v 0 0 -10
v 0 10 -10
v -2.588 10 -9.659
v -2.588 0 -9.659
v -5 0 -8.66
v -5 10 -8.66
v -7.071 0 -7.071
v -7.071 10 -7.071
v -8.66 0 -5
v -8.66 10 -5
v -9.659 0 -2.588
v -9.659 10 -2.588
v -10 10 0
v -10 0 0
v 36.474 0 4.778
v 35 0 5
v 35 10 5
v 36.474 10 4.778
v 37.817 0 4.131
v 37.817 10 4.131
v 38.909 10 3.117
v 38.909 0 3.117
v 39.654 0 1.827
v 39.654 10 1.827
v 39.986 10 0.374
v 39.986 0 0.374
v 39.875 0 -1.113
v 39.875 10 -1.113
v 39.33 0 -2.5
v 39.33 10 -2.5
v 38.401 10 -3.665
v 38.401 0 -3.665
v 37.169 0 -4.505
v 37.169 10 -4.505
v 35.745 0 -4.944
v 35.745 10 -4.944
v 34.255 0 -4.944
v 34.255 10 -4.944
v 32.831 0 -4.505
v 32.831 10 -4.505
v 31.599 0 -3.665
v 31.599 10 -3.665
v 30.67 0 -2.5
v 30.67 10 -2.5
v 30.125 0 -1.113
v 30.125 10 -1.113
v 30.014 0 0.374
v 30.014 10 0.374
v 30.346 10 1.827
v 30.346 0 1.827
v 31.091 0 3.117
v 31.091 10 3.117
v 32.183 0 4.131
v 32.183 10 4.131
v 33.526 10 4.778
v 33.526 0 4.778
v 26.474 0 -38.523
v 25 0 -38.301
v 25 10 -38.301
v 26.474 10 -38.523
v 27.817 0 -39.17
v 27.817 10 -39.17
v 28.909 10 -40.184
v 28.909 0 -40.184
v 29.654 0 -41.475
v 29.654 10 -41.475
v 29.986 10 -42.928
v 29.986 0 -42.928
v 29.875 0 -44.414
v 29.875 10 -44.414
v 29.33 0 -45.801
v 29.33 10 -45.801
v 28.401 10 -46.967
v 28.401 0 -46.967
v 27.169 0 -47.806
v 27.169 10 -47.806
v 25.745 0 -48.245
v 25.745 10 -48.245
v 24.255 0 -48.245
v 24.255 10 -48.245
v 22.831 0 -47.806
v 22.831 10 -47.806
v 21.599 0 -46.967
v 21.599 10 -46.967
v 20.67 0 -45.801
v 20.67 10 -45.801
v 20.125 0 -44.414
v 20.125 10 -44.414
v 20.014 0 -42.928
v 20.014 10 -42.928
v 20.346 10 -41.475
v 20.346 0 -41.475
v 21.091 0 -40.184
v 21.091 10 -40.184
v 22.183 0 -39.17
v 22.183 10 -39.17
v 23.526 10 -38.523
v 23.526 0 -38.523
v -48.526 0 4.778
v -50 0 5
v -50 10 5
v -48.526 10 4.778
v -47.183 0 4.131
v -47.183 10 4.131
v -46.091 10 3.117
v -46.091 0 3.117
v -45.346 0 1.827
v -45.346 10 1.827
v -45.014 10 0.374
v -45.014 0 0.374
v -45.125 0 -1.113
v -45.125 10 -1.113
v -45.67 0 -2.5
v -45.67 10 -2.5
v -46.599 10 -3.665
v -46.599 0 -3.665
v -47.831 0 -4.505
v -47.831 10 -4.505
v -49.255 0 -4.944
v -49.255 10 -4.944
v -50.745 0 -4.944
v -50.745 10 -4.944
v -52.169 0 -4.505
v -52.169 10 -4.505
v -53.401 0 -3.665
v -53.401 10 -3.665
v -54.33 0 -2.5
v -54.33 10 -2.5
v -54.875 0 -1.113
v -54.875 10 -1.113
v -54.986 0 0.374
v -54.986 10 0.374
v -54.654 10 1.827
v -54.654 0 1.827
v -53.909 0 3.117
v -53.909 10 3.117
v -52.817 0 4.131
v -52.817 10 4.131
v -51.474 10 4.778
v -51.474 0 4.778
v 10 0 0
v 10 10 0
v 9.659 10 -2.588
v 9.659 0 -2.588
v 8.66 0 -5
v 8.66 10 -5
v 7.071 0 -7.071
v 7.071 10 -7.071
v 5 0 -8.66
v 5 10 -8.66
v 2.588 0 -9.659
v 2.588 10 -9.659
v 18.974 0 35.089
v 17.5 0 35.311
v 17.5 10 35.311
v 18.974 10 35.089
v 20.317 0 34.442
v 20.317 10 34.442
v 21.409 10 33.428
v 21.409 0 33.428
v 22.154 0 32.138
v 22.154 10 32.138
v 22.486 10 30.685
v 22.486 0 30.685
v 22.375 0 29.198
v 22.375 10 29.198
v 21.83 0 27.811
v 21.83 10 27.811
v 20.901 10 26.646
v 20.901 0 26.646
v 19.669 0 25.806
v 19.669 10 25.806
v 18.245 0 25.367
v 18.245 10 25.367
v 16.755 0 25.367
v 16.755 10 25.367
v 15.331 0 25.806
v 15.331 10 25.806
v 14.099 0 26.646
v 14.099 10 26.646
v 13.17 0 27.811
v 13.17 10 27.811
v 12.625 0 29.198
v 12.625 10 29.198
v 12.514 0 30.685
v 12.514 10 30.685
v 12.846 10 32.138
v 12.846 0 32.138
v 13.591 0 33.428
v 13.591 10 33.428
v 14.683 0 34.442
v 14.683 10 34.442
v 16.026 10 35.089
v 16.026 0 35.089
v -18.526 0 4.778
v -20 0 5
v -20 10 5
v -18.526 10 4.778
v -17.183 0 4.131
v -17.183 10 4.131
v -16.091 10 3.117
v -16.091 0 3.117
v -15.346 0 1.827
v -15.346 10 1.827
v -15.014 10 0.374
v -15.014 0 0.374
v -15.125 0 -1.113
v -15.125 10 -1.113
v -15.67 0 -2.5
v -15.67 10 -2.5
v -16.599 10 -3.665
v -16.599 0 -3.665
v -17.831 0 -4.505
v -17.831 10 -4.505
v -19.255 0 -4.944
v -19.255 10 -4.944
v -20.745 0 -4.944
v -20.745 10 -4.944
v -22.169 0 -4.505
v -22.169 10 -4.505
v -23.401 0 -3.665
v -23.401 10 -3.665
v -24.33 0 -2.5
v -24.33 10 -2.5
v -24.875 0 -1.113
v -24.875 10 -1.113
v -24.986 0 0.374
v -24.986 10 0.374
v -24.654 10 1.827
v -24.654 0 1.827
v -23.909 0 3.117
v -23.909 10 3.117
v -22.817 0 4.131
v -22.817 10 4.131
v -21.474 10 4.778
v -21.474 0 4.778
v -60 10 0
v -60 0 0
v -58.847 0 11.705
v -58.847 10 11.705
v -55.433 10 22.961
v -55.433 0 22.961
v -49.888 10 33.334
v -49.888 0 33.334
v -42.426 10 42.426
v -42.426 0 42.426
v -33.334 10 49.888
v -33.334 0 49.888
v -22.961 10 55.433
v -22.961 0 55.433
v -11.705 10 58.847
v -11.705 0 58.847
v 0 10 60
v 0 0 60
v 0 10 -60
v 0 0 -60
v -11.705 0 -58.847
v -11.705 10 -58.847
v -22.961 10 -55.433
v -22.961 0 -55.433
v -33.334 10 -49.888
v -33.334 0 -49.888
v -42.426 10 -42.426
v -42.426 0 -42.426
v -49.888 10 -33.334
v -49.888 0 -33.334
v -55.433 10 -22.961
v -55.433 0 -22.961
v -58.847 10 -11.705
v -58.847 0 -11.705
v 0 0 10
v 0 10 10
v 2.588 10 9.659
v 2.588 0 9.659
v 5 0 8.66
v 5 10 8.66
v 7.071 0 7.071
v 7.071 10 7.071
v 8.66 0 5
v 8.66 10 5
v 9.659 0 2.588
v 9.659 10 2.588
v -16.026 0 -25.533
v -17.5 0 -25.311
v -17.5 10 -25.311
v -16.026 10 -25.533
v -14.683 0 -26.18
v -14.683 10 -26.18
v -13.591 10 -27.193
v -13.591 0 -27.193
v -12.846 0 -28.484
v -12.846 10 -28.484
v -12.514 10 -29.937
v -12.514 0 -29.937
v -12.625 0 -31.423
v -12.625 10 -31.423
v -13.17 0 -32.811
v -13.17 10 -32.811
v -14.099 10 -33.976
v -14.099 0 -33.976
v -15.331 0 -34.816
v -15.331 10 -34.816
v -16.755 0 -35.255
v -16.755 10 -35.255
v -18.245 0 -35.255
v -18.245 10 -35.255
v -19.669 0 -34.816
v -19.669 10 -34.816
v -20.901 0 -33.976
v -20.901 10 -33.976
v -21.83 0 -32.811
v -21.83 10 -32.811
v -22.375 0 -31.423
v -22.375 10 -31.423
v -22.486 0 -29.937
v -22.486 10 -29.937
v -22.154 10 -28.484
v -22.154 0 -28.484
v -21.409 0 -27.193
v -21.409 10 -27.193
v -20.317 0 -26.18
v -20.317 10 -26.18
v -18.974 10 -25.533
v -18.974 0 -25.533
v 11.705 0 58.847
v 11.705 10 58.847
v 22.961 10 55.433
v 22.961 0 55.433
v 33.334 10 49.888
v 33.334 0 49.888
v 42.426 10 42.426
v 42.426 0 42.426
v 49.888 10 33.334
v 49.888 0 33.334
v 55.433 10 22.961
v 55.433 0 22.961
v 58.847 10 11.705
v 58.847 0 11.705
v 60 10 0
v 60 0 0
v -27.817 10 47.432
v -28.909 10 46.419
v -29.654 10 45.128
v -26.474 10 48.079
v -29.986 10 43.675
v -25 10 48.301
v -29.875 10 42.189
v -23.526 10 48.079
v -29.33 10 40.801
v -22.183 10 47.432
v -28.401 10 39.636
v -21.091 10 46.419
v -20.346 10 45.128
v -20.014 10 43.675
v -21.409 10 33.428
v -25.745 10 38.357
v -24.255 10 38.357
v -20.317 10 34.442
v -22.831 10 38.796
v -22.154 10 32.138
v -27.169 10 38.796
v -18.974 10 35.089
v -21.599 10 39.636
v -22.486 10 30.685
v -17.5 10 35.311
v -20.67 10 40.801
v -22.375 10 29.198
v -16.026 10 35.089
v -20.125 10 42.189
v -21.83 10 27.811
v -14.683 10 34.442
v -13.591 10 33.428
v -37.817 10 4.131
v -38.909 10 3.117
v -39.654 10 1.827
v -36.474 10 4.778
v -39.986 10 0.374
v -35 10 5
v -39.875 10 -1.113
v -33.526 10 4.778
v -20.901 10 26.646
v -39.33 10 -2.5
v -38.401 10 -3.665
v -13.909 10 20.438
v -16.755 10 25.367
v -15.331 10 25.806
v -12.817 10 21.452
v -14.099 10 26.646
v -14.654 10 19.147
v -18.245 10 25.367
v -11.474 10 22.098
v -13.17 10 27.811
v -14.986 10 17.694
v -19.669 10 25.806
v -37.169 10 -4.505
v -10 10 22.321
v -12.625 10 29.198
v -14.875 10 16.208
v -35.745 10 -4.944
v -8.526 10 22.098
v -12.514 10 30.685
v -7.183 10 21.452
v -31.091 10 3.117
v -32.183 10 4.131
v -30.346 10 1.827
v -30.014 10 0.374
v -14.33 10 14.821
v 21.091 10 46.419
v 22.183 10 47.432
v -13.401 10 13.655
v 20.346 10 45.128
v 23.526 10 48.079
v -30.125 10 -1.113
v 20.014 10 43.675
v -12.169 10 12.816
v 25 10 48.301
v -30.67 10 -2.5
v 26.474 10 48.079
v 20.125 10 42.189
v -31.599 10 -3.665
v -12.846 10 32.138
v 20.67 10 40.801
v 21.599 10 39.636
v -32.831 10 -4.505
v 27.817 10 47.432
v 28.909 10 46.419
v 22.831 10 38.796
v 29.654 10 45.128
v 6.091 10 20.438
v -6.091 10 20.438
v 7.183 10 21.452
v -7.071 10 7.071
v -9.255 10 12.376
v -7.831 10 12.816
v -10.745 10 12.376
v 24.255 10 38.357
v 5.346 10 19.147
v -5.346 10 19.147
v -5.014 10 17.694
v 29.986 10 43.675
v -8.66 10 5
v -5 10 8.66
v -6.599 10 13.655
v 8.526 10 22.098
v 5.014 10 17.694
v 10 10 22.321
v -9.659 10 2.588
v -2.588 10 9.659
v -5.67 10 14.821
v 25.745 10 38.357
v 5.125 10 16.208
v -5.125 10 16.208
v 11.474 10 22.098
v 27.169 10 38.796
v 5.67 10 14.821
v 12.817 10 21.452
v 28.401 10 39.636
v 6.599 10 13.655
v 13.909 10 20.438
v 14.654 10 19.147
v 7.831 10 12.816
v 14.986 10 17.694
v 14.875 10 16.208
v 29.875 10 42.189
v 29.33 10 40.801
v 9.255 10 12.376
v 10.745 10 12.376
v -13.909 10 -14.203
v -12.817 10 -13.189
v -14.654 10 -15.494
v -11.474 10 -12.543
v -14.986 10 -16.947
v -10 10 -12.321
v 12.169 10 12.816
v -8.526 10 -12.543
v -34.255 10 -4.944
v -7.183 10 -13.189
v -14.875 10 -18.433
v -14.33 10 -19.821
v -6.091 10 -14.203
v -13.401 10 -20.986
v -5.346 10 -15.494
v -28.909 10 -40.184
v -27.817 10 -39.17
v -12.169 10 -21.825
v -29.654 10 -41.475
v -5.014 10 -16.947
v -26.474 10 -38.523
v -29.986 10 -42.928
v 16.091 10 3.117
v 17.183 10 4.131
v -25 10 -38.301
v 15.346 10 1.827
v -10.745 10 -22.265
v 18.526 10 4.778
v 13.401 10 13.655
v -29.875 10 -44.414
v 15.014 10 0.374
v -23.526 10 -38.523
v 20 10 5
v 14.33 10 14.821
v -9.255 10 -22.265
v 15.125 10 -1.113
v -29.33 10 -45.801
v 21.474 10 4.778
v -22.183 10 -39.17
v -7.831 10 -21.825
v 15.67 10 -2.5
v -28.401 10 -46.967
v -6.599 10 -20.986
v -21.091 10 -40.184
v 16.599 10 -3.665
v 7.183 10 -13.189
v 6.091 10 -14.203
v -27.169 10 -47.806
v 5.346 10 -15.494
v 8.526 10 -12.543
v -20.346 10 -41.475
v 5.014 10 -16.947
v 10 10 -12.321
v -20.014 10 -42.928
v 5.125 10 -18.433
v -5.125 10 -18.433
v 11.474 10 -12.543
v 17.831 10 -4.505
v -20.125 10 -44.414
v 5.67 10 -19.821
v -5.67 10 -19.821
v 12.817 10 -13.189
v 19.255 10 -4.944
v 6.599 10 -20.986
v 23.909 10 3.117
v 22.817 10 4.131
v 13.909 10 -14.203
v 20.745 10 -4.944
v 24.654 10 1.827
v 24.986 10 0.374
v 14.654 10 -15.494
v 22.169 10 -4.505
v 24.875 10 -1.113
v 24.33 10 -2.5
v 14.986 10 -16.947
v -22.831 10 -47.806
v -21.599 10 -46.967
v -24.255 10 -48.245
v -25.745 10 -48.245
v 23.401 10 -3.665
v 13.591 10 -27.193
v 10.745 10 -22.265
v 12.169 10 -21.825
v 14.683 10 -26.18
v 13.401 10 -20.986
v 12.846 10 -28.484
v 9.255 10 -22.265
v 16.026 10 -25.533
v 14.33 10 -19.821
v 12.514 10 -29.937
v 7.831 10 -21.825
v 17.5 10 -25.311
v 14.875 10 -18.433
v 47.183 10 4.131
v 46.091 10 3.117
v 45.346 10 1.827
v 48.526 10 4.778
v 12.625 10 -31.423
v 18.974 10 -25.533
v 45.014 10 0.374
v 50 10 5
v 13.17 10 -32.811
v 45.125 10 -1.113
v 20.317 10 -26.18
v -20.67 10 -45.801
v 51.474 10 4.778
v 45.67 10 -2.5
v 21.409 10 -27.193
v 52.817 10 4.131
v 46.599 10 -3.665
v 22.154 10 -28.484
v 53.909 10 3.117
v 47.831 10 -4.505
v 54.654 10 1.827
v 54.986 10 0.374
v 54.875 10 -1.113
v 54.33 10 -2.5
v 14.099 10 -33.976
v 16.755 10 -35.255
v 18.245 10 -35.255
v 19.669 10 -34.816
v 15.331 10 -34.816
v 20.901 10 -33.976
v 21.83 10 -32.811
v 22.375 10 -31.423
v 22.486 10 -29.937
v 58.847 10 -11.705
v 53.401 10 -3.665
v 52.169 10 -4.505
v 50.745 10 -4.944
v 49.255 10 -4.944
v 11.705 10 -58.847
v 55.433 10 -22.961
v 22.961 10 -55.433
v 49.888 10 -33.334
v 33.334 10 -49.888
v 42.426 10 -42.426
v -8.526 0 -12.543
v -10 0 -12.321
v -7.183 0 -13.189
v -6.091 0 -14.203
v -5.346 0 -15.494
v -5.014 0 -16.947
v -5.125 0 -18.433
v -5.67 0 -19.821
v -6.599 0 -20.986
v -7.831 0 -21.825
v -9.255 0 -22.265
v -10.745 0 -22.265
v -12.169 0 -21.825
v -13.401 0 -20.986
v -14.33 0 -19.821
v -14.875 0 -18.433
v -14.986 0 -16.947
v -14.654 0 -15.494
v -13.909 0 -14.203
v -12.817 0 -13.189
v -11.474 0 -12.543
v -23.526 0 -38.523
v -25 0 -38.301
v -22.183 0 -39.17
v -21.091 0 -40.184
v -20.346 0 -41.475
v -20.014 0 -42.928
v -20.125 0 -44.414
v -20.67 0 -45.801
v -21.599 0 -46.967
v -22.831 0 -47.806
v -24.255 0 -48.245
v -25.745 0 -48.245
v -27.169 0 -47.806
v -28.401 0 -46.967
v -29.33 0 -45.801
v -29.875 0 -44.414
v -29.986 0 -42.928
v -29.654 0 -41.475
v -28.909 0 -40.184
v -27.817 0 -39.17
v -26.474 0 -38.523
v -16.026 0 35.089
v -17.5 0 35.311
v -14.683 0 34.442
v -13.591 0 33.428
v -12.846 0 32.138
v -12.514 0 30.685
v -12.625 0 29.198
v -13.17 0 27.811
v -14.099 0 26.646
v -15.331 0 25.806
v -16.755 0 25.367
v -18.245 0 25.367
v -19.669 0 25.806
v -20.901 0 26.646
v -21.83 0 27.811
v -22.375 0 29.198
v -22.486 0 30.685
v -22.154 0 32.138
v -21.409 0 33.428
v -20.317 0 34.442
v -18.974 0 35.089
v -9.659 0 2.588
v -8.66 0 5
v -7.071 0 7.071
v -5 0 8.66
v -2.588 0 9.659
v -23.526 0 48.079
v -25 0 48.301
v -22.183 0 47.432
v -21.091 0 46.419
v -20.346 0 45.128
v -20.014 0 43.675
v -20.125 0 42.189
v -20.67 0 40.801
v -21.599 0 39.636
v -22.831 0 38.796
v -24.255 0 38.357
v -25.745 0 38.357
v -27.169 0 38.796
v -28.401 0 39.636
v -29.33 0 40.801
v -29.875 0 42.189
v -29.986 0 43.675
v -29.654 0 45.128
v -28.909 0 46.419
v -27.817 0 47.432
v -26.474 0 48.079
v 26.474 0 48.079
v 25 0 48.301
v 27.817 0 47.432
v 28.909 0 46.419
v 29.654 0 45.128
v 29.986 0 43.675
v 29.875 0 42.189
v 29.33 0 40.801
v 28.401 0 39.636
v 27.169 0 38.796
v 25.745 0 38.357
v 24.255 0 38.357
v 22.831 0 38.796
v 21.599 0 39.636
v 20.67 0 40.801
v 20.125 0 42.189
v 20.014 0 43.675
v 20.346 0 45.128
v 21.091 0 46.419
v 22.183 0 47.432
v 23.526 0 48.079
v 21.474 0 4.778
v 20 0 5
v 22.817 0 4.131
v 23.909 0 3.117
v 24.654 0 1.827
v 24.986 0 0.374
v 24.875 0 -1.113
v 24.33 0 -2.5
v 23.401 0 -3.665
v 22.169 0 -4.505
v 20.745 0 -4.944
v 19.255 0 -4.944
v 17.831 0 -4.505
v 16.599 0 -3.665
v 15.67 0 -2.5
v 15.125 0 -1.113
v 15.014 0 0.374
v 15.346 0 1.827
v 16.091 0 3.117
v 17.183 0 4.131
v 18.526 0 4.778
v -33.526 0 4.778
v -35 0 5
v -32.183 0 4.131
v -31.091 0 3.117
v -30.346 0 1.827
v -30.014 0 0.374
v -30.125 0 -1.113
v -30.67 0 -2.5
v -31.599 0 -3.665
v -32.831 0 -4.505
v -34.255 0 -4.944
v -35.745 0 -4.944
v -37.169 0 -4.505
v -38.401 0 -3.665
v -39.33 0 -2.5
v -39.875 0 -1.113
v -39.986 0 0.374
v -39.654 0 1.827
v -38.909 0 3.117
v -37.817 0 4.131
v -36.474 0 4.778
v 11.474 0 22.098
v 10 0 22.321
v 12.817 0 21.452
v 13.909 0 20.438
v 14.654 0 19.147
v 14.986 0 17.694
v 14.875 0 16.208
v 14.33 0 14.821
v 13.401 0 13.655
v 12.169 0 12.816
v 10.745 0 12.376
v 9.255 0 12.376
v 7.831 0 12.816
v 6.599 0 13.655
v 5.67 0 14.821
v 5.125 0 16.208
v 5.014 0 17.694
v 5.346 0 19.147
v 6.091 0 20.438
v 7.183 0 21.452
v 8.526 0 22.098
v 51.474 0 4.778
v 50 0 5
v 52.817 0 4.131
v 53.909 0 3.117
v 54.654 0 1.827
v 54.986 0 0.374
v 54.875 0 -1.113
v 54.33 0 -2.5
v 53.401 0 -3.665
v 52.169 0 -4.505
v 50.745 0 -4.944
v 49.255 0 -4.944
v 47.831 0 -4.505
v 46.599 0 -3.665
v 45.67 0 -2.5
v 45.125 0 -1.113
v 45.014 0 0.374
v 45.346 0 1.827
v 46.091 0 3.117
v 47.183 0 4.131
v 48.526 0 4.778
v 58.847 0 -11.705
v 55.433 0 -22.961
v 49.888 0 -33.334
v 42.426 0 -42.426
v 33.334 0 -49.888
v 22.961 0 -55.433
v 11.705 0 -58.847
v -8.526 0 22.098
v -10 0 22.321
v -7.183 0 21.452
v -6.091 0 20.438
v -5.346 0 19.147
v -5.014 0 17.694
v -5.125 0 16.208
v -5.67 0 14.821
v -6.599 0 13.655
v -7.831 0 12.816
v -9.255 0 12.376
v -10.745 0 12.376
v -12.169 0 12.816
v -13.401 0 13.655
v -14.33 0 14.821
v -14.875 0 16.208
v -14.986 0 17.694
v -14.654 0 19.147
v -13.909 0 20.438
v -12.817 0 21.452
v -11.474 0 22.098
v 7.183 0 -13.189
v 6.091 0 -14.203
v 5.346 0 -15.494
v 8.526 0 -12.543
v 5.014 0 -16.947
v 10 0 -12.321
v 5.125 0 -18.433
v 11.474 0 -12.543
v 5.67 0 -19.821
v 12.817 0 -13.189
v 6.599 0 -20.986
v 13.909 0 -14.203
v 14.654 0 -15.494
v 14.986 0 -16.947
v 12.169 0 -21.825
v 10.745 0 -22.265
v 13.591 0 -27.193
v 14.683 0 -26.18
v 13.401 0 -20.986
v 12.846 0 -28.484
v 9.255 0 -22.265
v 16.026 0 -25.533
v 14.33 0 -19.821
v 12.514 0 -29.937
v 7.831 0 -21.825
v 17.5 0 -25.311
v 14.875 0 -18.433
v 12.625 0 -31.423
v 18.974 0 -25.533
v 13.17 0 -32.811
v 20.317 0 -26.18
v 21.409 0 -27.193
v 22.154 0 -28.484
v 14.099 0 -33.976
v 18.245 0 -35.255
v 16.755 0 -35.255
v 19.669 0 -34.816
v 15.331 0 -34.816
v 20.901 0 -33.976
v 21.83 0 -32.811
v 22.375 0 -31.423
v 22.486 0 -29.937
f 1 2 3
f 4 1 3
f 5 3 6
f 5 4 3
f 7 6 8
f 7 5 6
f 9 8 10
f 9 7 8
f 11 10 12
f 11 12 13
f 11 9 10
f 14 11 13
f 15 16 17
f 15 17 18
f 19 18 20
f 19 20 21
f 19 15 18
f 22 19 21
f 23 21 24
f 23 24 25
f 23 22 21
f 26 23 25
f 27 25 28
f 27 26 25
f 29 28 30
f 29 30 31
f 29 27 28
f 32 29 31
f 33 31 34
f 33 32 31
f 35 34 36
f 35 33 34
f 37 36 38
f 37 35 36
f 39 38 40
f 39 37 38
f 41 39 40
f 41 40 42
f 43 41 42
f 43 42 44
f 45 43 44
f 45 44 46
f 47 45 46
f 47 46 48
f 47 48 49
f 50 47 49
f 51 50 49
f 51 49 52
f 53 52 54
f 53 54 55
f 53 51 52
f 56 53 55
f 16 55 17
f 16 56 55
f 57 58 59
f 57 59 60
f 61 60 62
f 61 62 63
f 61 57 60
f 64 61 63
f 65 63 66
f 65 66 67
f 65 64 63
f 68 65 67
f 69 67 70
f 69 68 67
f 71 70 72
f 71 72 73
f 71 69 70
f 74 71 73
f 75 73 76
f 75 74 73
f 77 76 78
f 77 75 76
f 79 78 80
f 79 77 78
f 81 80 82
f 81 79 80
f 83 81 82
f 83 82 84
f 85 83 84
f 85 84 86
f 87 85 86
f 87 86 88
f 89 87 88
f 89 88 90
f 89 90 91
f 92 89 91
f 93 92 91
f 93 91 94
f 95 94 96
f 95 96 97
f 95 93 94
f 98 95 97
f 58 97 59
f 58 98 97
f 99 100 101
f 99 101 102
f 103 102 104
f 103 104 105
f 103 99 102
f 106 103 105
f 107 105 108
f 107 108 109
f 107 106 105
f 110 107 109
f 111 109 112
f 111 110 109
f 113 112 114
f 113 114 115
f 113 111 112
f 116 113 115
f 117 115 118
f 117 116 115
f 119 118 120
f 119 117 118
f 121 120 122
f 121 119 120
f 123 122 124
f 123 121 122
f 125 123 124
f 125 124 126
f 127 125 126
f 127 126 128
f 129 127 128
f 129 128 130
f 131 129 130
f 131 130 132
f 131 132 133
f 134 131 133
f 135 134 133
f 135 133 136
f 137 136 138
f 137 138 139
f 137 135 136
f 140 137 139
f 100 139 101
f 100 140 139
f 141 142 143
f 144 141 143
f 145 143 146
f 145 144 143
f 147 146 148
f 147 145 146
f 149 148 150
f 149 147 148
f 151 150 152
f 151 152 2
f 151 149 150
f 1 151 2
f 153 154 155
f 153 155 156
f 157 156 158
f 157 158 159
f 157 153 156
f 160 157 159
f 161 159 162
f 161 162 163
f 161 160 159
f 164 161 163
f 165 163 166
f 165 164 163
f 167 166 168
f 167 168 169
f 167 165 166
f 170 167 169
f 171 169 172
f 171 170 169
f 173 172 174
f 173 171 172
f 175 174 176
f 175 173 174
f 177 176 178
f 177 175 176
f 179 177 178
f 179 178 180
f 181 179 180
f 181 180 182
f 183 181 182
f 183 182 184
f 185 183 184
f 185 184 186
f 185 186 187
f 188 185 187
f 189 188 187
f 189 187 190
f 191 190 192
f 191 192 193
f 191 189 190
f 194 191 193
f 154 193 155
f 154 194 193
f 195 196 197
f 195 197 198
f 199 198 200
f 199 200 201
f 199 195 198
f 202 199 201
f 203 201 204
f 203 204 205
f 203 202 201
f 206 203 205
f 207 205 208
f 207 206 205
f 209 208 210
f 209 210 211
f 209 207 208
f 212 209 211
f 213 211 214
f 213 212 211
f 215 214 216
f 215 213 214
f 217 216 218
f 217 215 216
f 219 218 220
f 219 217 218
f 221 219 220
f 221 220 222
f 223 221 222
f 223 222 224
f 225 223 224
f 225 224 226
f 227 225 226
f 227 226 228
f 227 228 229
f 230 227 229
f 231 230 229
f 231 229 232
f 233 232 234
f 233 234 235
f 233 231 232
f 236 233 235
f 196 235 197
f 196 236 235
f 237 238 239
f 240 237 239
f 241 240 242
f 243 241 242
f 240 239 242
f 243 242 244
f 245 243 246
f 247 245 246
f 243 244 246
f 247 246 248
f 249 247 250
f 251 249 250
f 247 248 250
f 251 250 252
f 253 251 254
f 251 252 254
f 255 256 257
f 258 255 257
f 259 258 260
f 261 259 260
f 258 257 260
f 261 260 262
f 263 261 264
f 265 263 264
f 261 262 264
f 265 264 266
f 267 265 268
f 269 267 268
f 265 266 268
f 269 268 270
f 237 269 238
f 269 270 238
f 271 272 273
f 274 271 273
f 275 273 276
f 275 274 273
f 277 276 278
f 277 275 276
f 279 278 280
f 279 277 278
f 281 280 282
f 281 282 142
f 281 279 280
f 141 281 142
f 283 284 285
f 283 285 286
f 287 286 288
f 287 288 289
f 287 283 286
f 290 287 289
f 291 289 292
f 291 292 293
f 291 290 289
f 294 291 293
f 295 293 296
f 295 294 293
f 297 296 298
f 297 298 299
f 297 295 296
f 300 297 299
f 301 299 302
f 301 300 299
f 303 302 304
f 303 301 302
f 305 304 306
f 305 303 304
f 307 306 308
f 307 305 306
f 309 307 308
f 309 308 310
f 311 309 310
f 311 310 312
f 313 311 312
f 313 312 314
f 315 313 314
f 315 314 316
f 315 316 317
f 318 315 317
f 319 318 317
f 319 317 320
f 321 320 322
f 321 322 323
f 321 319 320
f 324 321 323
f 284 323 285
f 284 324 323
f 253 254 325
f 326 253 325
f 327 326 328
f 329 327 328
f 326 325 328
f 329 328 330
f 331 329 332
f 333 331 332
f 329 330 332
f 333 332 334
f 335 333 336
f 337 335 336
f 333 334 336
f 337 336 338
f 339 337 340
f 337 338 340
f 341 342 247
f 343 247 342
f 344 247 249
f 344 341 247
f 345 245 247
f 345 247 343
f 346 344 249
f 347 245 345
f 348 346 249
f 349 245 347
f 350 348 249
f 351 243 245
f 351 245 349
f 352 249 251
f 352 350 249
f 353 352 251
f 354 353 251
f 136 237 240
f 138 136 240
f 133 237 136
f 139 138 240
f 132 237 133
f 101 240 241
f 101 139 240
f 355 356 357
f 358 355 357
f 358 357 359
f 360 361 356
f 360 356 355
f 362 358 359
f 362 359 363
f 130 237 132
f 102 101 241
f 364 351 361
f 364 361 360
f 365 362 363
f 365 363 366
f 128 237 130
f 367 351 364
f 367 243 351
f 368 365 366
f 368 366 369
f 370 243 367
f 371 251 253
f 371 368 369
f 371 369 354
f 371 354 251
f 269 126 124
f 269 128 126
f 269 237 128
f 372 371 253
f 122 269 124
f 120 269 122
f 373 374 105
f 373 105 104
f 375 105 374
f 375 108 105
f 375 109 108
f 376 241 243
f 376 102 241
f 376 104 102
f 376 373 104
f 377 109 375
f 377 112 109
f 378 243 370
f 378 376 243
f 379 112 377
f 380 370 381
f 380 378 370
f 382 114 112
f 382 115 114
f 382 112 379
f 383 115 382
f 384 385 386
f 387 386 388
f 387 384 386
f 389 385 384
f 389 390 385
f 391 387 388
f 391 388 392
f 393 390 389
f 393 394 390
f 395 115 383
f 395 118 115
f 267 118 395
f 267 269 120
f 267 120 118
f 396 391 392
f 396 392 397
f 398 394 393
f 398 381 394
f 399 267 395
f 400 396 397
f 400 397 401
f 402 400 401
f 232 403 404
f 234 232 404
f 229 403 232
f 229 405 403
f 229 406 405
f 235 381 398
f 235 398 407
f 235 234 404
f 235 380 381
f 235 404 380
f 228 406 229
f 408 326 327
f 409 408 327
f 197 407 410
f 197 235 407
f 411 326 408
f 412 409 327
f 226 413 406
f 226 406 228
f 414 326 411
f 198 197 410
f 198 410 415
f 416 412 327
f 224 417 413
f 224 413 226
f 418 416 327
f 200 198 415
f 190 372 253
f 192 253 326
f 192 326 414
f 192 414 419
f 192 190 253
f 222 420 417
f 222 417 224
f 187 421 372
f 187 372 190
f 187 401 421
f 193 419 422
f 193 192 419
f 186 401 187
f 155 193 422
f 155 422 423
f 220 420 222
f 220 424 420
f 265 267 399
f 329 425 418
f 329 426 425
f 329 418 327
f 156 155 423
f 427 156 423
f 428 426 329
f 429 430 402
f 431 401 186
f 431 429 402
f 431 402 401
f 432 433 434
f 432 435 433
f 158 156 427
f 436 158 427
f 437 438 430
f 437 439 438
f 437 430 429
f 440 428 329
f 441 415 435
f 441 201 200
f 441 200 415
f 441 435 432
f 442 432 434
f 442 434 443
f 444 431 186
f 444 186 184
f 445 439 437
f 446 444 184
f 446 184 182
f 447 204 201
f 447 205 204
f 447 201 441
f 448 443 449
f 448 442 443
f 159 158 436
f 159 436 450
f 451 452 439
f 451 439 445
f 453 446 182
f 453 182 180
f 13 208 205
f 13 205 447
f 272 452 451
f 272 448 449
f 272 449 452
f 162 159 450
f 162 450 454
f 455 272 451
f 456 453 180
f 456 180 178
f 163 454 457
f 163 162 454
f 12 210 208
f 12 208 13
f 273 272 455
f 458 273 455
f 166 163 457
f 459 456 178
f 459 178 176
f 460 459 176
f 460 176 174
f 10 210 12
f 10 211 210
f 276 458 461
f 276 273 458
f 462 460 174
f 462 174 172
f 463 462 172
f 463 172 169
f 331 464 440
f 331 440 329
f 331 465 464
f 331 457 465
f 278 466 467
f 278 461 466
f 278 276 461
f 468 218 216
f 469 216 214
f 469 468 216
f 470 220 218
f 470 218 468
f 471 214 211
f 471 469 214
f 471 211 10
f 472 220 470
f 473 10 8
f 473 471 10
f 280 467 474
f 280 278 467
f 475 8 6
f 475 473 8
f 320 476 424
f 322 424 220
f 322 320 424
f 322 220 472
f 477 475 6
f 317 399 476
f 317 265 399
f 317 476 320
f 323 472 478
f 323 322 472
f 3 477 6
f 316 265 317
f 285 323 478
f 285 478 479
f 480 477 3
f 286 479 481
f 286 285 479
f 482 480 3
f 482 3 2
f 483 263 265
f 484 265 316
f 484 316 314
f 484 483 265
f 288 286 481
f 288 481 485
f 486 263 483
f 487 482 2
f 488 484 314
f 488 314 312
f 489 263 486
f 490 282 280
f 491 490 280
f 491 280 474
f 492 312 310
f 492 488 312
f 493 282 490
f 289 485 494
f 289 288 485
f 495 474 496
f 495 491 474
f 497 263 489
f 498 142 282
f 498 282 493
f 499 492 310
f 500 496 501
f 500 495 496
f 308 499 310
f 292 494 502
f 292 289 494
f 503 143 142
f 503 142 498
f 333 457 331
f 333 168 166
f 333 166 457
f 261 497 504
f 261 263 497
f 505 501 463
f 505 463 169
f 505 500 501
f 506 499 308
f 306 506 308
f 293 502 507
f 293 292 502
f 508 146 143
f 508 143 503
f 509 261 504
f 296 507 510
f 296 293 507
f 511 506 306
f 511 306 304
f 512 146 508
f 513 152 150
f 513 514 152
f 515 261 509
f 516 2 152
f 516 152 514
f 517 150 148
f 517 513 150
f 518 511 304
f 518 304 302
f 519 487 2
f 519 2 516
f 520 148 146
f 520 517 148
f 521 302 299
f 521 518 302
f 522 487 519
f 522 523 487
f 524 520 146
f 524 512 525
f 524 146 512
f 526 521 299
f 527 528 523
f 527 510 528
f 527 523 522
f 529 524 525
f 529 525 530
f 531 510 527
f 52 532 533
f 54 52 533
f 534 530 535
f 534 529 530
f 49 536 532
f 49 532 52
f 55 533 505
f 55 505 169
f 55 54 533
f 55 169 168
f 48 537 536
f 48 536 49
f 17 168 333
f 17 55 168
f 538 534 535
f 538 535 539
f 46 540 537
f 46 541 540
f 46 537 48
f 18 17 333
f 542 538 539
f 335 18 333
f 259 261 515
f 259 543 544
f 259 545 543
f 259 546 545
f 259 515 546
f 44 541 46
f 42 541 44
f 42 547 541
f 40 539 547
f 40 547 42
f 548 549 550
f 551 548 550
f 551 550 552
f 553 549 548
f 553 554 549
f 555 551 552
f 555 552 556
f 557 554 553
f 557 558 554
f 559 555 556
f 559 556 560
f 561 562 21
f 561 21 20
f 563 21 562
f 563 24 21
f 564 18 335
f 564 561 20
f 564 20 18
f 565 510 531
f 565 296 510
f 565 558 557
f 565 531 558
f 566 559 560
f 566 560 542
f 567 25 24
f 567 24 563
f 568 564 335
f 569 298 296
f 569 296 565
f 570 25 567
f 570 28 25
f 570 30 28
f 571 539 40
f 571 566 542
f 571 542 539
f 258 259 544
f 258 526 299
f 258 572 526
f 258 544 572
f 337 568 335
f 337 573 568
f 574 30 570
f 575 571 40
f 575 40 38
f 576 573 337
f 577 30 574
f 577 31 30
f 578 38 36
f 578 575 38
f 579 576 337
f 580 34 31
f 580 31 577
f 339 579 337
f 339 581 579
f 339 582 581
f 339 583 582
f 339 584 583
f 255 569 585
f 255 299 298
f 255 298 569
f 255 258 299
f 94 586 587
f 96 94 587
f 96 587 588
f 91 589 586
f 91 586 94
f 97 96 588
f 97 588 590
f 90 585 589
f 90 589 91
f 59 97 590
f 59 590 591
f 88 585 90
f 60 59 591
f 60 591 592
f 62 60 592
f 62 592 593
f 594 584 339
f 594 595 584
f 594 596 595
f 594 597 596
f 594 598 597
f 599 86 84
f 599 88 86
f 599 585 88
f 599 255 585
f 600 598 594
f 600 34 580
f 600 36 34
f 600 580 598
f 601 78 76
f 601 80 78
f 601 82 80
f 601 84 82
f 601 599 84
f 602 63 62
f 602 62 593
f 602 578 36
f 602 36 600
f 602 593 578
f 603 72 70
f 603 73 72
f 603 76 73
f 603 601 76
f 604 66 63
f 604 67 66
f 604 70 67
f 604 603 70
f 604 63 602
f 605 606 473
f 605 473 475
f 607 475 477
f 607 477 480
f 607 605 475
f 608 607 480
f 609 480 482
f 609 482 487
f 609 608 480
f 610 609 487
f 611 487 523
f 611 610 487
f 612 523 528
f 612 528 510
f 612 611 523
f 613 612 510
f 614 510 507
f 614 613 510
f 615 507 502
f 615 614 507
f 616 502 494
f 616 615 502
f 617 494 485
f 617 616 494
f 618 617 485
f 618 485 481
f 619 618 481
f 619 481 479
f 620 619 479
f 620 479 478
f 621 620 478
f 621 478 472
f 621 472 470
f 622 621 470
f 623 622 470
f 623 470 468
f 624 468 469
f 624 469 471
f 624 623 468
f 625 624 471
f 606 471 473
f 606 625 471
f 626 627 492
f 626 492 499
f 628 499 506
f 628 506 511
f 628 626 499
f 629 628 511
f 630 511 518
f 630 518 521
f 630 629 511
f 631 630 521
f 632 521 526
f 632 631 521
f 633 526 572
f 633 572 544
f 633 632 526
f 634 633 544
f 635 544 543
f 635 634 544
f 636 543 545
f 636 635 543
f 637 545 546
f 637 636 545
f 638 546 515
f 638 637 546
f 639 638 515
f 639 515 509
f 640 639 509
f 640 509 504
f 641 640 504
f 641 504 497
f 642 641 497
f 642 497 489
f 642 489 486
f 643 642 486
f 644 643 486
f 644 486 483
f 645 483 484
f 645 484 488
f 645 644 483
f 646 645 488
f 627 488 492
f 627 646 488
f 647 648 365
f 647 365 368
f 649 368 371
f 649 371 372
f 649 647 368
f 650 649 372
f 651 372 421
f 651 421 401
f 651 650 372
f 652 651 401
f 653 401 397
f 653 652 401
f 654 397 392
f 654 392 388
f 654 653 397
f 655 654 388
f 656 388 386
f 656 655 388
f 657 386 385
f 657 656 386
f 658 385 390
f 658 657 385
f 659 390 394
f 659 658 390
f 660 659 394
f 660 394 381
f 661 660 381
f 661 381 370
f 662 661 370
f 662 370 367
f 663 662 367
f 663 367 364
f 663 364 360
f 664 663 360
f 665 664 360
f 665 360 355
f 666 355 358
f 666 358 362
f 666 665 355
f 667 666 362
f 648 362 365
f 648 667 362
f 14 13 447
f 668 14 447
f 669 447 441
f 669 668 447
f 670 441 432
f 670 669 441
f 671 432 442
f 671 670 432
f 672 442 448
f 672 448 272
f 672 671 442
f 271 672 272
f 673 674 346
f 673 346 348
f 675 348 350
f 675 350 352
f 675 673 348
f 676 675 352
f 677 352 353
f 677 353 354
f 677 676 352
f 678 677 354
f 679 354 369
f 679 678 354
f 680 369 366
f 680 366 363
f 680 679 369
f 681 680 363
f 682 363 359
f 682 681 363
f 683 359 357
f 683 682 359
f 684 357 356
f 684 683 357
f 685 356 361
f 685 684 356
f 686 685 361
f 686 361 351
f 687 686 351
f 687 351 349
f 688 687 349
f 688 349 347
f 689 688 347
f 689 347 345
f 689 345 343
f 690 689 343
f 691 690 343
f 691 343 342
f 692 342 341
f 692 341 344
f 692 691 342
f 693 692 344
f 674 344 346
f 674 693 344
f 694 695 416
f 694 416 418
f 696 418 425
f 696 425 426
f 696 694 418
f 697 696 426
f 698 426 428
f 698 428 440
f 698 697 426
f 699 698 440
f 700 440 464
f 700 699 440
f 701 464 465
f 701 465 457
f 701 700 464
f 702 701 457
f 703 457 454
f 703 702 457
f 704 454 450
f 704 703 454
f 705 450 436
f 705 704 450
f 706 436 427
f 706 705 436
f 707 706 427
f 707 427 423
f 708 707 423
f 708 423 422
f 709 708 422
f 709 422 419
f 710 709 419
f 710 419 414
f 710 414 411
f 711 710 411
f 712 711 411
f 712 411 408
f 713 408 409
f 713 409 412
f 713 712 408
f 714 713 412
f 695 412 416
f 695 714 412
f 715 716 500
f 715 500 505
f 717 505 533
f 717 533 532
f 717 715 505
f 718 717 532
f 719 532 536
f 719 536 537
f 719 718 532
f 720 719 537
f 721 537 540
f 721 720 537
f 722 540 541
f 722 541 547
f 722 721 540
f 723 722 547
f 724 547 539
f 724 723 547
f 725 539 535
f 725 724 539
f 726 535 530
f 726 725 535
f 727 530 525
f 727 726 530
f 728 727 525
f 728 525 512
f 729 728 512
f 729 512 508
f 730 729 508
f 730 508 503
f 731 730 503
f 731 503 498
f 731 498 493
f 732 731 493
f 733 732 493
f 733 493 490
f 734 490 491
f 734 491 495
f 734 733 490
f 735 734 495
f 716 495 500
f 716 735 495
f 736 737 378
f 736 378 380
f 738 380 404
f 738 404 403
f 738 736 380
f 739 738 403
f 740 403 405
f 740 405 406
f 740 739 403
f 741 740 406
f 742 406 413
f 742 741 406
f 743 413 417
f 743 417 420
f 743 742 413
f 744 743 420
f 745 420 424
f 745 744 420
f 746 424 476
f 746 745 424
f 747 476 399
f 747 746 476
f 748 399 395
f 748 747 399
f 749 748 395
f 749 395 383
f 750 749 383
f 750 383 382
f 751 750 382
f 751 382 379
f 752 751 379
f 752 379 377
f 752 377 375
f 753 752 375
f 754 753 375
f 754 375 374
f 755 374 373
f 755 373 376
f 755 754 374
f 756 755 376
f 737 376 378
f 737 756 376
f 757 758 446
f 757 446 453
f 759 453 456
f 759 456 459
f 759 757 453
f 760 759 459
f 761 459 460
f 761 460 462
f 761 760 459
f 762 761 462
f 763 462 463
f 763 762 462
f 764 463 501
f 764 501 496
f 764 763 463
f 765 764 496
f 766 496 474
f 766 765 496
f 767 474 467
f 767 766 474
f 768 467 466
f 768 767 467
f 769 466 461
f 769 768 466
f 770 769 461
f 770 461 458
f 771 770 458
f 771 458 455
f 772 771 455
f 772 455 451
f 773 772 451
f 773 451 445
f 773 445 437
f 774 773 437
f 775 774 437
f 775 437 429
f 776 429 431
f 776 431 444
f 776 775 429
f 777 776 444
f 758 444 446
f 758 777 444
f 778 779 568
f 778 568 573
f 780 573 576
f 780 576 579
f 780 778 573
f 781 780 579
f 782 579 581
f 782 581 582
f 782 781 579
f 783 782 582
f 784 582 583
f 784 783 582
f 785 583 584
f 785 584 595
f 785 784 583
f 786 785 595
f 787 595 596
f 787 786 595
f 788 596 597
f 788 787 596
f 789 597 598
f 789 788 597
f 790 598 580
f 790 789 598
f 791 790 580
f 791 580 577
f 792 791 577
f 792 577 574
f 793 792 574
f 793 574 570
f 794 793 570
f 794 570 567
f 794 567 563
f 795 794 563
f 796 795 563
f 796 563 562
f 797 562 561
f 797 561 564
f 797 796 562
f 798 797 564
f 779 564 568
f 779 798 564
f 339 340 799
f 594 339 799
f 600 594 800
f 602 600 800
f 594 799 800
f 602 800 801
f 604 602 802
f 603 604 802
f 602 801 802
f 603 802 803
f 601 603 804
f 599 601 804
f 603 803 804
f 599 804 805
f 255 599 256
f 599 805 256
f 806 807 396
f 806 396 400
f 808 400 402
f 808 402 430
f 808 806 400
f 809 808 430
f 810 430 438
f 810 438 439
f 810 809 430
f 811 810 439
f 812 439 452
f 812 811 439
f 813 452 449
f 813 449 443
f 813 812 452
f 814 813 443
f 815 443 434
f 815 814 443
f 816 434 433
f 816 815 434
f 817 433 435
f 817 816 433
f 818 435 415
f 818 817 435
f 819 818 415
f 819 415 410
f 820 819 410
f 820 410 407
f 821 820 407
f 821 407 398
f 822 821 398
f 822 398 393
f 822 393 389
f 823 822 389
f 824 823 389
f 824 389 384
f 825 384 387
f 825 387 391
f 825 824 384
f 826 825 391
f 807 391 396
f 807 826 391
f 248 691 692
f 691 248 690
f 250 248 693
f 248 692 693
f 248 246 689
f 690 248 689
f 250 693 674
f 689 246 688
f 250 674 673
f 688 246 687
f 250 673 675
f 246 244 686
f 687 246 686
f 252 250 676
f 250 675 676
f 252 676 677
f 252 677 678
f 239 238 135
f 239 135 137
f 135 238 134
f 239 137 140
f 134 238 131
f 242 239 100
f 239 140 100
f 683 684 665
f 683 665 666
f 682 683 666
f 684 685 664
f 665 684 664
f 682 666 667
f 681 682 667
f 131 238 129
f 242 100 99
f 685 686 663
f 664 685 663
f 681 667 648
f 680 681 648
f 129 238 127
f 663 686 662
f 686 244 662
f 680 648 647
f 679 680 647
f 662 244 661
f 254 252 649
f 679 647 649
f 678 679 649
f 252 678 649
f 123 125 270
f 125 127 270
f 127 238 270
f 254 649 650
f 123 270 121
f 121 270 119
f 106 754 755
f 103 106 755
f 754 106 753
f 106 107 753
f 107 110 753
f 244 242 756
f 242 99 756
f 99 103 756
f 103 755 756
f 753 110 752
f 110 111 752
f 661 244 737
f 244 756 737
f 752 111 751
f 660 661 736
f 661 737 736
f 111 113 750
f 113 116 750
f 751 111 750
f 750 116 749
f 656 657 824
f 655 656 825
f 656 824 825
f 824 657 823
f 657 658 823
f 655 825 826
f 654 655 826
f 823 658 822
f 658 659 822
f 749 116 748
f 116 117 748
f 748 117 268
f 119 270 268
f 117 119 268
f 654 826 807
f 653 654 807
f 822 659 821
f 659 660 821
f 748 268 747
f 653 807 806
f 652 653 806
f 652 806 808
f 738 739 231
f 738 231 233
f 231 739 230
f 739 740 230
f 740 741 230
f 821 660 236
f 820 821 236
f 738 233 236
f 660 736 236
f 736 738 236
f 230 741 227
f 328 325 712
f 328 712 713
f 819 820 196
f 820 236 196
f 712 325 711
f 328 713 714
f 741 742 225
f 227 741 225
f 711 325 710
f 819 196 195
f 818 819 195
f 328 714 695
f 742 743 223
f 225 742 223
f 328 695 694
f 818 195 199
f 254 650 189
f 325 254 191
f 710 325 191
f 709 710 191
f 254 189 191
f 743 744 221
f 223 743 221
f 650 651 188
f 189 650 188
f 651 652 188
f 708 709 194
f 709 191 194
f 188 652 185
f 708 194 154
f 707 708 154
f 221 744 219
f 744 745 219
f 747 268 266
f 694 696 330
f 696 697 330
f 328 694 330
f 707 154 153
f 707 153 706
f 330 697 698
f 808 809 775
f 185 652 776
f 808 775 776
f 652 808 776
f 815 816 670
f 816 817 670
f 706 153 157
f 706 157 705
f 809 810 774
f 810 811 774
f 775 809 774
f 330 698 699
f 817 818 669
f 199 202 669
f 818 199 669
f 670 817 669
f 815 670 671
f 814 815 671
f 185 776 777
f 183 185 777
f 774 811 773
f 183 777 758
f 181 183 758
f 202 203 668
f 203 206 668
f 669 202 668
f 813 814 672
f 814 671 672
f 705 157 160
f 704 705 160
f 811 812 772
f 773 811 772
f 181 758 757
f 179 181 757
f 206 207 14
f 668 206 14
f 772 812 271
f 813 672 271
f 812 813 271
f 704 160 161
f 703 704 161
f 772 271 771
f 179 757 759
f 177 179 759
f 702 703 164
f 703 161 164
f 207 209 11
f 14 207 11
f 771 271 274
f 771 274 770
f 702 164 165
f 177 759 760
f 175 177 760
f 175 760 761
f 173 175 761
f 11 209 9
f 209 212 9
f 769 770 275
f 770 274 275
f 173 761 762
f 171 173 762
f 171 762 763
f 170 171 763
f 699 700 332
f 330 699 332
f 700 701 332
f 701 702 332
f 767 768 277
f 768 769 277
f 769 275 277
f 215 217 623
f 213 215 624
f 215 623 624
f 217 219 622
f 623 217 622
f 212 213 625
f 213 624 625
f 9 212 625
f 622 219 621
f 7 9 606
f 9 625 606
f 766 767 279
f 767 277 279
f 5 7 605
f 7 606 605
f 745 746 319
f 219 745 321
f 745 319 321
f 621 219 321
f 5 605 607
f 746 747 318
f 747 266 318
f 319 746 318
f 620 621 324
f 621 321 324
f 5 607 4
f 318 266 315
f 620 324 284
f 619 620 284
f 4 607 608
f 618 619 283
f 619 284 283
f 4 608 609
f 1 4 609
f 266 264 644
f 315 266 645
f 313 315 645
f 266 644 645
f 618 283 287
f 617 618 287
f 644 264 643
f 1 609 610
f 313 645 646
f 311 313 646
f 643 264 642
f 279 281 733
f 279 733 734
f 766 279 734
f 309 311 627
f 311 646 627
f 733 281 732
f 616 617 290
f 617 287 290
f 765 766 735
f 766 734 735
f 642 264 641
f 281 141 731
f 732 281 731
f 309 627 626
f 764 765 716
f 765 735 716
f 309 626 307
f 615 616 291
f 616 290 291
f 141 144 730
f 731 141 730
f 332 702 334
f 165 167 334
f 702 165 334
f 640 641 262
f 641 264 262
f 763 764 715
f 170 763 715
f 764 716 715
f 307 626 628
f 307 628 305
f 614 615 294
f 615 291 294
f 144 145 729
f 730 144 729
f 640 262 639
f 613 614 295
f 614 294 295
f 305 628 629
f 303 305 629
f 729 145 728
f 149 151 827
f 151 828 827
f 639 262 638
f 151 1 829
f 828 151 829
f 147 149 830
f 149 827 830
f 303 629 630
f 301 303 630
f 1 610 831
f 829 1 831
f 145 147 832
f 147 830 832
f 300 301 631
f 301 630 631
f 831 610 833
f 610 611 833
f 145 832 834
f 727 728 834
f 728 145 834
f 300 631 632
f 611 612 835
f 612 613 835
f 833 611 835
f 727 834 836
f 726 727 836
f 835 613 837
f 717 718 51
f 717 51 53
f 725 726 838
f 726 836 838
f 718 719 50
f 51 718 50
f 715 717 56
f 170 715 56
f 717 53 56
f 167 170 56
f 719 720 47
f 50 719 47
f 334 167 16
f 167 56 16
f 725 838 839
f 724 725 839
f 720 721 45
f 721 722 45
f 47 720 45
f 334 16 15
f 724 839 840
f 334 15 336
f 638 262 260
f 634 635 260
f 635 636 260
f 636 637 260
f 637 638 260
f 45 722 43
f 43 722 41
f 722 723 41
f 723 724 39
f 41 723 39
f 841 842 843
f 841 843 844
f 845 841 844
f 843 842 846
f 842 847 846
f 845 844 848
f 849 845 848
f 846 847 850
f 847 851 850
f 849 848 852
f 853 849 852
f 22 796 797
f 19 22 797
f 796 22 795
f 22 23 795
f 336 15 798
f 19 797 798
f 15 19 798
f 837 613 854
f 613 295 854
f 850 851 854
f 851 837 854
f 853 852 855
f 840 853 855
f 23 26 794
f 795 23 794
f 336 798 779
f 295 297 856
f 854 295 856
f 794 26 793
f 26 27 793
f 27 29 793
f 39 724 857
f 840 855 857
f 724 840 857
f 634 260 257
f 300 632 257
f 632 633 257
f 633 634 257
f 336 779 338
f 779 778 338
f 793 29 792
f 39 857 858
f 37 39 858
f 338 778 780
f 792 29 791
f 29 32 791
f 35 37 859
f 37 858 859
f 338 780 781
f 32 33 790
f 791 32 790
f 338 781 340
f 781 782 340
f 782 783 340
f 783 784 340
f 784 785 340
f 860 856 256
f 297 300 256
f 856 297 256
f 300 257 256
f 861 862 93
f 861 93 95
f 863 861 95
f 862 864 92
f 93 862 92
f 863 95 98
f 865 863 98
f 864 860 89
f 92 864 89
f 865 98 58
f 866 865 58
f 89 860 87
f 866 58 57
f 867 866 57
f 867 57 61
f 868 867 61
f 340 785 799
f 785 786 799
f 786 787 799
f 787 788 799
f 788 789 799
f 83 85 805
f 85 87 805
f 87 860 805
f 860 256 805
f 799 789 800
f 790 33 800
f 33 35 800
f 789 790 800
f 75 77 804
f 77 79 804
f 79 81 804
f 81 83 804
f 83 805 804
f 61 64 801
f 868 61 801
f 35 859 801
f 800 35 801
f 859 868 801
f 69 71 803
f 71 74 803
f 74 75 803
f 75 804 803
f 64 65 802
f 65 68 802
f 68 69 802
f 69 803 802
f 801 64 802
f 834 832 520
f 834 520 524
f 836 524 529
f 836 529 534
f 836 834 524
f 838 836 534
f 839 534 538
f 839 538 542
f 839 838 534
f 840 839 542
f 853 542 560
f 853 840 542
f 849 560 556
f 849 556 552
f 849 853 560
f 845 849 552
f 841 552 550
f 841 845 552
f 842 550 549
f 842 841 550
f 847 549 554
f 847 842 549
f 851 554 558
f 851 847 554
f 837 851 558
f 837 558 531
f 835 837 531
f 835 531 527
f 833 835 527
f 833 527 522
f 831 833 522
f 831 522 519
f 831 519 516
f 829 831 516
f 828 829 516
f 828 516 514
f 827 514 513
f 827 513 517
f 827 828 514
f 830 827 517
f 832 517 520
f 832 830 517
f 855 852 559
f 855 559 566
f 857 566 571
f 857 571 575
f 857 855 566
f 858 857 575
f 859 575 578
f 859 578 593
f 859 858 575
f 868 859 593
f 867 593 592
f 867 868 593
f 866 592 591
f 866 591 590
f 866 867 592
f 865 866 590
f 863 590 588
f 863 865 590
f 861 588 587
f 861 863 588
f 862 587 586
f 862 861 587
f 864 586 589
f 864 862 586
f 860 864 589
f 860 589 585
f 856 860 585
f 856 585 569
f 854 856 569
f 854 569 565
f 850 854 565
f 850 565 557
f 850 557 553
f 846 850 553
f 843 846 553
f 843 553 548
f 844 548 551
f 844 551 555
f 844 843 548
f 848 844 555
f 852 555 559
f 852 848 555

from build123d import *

# Parameters (mm, degrees)
SKETCH1_R           = 5
BOSS_EXTRUDE2_DEPTH = 10


with BuildPart() as part:
    # Sketch1 → Boss-Extrude2 (new body)
    with BuildSketch(Plane(origin=(0, 0, 0), x_dir=(1, 0, 0), z_dir=(0, 1, 0))):
        with BuildLine():
            ThreePointArc((0, 60), (-42.426406871, 42.426406871), (-60, 0))
            ThreePointArc((-60, 0), (-42.426406871, -42.426406871), (0, -60))
            ThreePointArc((0, -60), (42.426406871, -42.426406871), (60, 0))
            ThreePointArc((60, 0), (42.426406871, 42.426406871), (0, 60))
        make_face()
        with Locations(Location((-25, 43.301270189, 0), (0, 0, 270))):
            Circle(SKETCH1_R, mode=Mode.SUBTRACT)
        with Locations(Location((-17.5, 30.310889132, 0), (0, 0, 270))):
            Circle(SKETCH1_R, mode=Mode.SUBTRACT)
        with Locations(Location((-10, 17.320508076, 0), (0, 0, 270))):
            Circle(SKETCH1_R, mode=Mode.SUBTRACT)
        with Locations(Location((25, 43.301270189, 0), (0, 0, 270))):
            Circle(SKETCH1_R, mode=Mode.SUBTRACT)
        with Locations(Location((17.5, 30.310889132, 0), (0, 0, 270))):
            Circle(SKETCH1_R, mode=Mode.SUBTRACT)
        with Locations(Location((10, 17.320508076, 0), (0, 0, 270))):
            Circle(SKETCH1_R, mode=Mode.SUBTRACT)
        with Locations(Location((50, 0, 0), (0, 0, 270))):
            Circle(SKETCH1_R, mode=Mode.SUBTRACT)
        with Locations(Location((35, 0, 0), (0, 0, 270))):
            Circle(SKETCH1_R, mode=Mode.SUBTRACT)
        with Locations(Location((20, 0, 0), (0, 0, 270))):
            Circle(SKETCH1_R, mode=Mode.SUBTRACT)
        with Locations(Location((25, -43.301270189, 0), (0, 0, 270))):
            Circle(SKETCH1_R, mode=Mode.SUBTRACT)
        with Locations(Location((17.5, -30.310889132, 0), (0, 0, 270))):
            Circle(SKETCH1_R, mode=Mode.SUBTRACT)
        with Locations(Location((10, -17.320508076, 0), (0, 0, 270))):
            Circle(SKETCH1_R, mode=Mode.SUBTRACT)
        with Locations(Location((-25, -43.301270189, 0), (0, 0, 270))):
            Circle(SKETCH1_R, mode=Mode.SUBTRACT)
        with Locations(Location((-17.5, -30.310889132, 0), (0, 0, 270))):
            Circle(SKETCH1_R, mode=Mode.SUBTRACT)
        with Locations(Location((-10, -17.320508076, 0), (0, 0, 270))):
            Circle(SKETCH1_R, mode=Mode.SUBTRACT)
        with Locations(Location((-50, 0, 0), (0, 0, 270))):
            Circle(SKETCH1_R, mode=Mode.SUBTRACT)
        with Locations(Location((-35, 0, 0), (0, 0, 270))):
            Circle(SKETCH1_R, mode=Mode.SUBTRACT)
        with Locations(Location((-20, 0, 0), (0, 0, 270))):
            Circle(SKETCH1_R, mode=Mode.SUBTRACT)
        with BuildLine():
            ThreePointArc((0, 10), (-7.071067812, 7.071067812), (-10, 0))
            ThreePointArc((-10, 0), (-7.071067812, -7.071067812), (0, -10))
            ThreePointArc((0, -10), (7.071067812, -7.071067812), (10, 0))
            ThreePointArc((10, 0), (7.071067812, 7.071067812), (0, 10))
        make_face(mode=Mode.SUBTRACT)
    extrude(amount=BOSS_EXTRUDE2_DEPTH)


solid = part.part
